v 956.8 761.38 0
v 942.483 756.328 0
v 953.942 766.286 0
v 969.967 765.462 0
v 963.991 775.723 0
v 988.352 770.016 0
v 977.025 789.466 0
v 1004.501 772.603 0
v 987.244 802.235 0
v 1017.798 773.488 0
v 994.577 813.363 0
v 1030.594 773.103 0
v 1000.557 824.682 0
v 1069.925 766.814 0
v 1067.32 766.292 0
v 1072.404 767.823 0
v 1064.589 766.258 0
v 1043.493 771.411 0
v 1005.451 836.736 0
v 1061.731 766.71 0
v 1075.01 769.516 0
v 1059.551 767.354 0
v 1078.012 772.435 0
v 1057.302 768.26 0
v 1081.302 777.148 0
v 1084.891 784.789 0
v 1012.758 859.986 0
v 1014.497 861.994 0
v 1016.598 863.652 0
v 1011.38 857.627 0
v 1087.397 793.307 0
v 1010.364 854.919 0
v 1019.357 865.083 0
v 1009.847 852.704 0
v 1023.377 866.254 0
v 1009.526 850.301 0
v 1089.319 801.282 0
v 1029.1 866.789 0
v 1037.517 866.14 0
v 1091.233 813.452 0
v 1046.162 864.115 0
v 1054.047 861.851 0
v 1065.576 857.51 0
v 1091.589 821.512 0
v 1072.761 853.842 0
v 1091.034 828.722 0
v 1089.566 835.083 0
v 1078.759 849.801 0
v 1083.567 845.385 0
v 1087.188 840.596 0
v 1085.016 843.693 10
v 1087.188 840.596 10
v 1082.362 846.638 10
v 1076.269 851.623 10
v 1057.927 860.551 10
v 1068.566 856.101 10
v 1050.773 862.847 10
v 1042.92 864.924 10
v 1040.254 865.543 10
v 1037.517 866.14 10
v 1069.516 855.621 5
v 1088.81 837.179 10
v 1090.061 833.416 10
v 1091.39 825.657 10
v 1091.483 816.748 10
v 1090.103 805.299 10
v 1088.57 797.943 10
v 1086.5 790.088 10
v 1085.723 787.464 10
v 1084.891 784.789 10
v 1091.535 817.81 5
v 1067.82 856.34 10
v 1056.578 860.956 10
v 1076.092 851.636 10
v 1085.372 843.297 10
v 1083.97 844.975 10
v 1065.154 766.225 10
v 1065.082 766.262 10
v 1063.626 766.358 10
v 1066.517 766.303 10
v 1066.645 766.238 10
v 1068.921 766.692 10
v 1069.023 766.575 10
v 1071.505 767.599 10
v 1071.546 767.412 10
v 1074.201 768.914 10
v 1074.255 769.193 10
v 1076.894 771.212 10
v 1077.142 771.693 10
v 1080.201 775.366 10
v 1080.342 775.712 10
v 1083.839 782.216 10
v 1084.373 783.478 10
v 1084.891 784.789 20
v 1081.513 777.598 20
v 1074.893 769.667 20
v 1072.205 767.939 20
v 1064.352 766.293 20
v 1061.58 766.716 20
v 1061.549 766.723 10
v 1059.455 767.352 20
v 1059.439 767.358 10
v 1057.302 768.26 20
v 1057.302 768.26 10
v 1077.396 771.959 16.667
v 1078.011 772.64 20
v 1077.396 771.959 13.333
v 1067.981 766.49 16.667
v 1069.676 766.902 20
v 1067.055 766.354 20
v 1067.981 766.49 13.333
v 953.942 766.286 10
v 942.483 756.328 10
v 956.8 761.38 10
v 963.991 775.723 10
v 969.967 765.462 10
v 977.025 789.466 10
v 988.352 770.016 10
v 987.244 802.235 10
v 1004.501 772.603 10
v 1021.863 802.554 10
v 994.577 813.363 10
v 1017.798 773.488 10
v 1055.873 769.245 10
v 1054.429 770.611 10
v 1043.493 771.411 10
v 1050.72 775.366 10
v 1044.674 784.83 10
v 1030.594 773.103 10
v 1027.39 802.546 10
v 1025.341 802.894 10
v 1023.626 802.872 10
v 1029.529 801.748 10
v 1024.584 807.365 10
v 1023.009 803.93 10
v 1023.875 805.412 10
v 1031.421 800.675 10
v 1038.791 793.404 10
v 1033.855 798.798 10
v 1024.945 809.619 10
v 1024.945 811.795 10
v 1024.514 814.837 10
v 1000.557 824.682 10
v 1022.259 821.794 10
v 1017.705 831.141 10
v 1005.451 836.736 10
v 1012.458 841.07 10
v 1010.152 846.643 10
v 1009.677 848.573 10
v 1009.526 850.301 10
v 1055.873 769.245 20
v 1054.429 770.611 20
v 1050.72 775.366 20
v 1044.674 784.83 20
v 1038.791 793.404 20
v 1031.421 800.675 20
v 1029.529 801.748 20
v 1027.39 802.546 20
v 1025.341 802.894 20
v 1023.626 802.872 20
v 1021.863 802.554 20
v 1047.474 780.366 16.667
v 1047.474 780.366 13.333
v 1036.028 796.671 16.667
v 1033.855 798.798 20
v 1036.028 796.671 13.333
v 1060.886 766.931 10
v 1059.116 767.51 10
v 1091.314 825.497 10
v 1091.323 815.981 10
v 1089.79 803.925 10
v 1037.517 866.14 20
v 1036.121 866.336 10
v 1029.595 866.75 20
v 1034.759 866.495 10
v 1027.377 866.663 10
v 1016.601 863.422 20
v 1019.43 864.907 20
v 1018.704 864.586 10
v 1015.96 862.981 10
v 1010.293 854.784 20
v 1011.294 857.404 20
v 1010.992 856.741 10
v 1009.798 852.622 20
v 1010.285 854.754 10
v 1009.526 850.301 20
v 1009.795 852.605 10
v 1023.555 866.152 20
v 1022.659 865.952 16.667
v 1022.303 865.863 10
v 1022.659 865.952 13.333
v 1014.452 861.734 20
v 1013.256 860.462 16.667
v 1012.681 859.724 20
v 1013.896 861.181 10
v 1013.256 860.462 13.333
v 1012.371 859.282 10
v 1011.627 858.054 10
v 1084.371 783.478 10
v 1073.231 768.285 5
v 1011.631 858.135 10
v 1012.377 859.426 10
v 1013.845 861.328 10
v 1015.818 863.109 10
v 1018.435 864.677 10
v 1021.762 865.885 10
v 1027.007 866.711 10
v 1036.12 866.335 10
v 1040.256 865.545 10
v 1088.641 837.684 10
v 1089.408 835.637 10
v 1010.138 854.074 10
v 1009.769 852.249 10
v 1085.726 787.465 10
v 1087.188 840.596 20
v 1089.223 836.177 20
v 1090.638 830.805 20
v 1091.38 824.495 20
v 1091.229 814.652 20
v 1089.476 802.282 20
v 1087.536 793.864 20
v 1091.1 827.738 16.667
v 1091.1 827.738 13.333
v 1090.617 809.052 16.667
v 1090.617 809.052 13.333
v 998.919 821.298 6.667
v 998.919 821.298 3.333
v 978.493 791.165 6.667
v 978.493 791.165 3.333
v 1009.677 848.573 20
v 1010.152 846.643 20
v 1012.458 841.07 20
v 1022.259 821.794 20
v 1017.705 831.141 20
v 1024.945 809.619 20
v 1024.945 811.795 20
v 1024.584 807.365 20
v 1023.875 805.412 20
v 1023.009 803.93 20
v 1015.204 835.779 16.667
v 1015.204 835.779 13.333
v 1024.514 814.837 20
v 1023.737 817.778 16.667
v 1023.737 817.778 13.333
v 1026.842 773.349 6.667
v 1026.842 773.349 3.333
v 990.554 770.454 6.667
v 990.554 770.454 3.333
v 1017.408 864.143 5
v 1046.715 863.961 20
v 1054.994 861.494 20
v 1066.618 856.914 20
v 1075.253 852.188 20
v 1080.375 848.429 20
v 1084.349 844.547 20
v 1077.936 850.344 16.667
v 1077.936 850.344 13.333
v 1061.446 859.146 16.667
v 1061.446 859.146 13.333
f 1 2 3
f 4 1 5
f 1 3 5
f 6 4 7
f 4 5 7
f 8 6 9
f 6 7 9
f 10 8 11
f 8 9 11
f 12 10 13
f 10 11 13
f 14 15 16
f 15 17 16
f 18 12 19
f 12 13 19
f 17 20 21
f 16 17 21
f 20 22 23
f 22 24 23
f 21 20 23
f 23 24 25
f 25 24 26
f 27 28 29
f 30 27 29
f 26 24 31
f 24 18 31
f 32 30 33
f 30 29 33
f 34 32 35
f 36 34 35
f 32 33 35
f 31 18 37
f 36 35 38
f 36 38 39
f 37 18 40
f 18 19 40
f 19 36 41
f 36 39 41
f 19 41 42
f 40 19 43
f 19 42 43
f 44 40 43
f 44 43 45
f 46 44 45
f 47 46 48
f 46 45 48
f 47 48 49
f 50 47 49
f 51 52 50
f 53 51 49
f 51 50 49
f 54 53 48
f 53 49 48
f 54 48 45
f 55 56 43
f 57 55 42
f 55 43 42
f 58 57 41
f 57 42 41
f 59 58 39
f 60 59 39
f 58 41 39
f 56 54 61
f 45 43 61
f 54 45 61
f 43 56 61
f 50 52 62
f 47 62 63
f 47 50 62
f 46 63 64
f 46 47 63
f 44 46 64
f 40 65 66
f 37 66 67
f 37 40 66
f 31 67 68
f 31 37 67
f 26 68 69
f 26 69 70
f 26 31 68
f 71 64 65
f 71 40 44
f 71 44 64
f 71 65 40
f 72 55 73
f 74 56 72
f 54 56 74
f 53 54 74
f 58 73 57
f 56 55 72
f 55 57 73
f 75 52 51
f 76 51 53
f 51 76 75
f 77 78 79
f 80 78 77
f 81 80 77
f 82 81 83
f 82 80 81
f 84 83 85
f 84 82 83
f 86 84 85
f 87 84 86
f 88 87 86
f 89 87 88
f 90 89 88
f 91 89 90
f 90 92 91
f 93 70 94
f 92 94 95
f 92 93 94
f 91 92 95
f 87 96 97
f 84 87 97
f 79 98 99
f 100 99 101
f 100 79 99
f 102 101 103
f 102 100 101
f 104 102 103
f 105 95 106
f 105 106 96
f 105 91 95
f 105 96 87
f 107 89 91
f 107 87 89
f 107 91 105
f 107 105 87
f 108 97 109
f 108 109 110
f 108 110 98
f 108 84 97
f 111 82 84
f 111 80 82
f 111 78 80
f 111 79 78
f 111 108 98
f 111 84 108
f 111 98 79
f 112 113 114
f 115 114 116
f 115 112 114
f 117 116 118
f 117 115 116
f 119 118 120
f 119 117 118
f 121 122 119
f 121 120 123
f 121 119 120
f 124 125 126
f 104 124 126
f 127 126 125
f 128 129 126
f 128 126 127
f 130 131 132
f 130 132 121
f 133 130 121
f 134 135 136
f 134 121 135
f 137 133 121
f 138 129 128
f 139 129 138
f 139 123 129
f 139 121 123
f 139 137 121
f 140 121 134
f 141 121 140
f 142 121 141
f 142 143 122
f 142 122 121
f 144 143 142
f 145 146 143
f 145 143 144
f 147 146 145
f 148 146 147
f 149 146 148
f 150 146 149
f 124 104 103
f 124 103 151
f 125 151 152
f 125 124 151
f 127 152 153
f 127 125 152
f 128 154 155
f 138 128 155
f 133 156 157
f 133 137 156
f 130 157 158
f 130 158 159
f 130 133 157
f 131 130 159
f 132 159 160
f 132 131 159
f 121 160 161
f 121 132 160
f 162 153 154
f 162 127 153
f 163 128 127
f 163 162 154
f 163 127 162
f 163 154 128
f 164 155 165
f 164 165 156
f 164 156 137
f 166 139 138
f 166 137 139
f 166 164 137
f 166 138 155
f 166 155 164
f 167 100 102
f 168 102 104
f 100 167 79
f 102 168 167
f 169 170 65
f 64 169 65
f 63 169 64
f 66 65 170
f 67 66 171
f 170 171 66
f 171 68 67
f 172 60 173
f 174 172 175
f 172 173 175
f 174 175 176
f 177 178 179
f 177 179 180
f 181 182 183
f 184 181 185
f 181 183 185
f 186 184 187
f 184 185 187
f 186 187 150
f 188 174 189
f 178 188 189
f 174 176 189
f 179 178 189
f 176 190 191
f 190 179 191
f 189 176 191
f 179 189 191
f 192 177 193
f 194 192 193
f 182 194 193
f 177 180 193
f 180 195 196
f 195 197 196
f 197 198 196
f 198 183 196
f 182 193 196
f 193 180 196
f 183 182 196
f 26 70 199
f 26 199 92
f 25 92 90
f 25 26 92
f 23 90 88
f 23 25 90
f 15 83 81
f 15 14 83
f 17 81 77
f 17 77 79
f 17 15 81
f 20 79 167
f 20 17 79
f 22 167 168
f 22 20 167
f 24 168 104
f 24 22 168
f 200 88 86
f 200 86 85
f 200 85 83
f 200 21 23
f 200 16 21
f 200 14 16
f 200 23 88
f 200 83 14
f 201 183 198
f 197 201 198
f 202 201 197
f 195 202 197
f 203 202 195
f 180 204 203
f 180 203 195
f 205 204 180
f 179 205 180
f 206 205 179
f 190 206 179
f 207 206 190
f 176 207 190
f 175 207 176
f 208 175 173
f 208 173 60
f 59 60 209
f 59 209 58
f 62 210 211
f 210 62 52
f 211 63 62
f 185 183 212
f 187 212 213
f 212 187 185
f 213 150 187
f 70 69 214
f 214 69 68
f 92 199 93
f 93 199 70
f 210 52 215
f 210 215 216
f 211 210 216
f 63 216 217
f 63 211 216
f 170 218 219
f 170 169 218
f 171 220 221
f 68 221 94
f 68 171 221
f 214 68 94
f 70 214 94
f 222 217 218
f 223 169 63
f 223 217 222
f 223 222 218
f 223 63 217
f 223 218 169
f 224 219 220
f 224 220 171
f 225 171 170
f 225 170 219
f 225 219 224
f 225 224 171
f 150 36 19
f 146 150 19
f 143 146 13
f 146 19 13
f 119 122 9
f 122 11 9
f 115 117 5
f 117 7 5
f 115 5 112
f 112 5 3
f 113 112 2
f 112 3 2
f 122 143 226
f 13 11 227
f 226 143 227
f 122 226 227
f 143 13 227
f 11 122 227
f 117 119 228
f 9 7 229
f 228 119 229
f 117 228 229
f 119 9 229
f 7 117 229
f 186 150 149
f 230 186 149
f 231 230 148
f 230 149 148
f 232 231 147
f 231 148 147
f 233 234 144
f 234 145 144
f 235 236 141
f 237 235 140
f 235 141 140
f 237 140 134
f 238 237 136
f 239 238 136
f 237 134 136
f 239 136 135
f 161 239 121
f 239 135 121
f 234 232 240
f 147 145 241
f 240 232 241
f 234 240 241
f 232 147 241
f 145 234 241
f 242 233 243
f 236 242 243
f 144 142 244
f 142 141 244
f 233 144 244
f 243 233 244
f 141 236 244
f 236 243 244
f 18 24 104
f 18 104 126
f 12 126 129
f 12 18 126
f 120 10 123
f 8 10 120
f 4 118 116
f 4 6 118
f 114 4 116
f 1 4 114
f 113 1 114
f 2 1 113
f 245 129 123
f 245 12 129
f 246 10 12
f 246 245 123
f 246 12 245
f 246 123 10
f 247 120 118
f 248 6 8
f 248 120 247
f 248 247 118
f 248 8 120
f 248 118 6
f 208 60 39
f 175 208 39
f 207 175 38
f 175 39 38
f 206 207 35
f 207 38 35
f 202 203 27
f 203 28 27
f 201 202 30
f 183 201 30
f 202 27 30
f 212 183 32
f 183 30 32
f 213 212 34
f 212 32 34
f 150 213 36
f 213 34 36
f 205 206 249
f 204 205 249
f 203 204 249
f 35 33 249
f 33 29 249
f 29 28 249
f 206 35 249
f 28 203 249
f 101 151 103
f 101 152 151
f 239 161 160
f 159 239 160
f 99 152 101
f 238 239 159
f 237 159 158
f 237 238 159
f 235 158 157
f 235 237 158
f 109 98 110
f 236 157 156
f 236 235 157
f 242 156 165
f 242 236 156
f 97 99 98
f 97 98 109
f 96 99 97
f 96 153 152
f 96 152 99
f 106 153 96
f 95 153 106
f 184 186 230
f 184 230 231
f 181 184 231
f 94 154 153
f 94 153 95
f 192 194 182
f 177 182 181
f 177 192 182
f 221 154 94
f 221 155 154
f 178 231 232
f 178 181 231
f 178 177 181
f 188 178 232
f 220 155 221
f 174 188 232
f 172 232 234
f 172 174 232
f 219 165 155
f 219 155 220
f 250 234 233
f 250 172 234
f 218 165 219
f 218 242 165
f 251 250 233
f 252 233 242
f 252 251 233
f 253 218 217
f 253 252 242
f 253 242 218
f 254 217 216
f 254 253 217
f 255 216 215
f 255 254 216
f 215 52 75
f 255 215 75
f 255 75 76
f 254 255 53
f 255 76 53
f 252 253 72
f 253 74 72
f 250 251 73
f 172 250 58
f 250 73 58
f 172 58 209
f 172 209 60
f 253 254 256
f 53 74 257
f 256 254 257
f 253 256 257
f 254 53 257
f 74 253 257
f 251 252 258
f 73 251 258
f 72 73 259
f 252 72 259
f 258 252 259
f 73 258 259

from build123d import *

# Parameters (mm, degrees)
BOSS_EXTRUDE1_DEPTH = 10
BOSS_EXTRUDE2_DEPTH = 10


with BuildPart() as part:
    # Sketch1 → Boss-Extrude1 (new body)
    with BuildSketch(Plane.XY):
        with BuildLine():
            add(Edge.make_bspline(
                [(1087.187780825, 840.59586504), (1076.67910482, 857.874790108), (1037.516605064, 866.140022112)],
                knots=[0, 0, 0, 1, 1, 1], degree=2))
            add(Edge.make_bspline(
                [(1037.516605064, 866.140022112), (1011.295592155, 870.066211203), (1009.525576357, 850.301034786)],
                knots=[0, 0, 0, 1, 1, 1], degree=2))
            add(Edge.make_bspline(
                [(1009.525576357, 850.301034786), (1001.907342818, 820.670179882), (988.206449115, 794.709110121), (942.482736763, 756.327533098)],
                knots=[0, 0, 0, 0, 1, 1, 1, 1], degree=3))
            add(Edge.make_bspline(
                [(1057.301588716, 768.260369991), (1027.770781215, 776.257647836), (998.429870334, 777.153516176), (942.482736763, 756.327533098)],
                knots=[0, 0, 0, 0, 1, 1, 1, 1], degree=3))
            add(Edge.make_bspline(
                [(1084.891265336, 784.788556571), (1075.365665589, 760.045488285), (1057.301588716, 768.260369991)],
                knots=[0, 0, 0, 1, 1, 1], degree=2))
            add(Edge.make_bspline(
                [(1087.187780825, 840.59586504), (1097.029795788, 822.928712911), (1084.891265336, 784.788556571)],
                knots=[0, 0, 0, 1, 1, 1], degree=2))
        make_face()
    extrude(amount=BOSS_EXTRUDE1_DEPTH)

    # Sketch3 → Boss-Extrude2 (add)
    with BuildSketch(Plane.XY.offset(10)):
        with BuildLine():
            add(Edge.make_bspline(
                [(1087.187780825, 840.59586504), (1081.487119197, 850.529819758), (1065.232454637, 860.336996081), (1037.516605064, 866.140022112)],
                knots=[0, 0, 0, 0, 1, 1, 1, 1], degree=3))
            add(Edge.make_bspline(
                [(1037.516605064, 866.140022112), (1020.004409568, 868.813580173), (1010.347971001, 862.587896026), (1009.525576357, 850.301034786)],
                knots=[0, 0, 0, 0, 1, 1, 1, 1], degree=3))
            add(Edge.make_bspline(
                [(1009.525576357, 850.301034786), (1009.355347436, 839.605465182), (1033.361525181, 814.302214514), (1021.863356533, 802.554480195)],
                knots=[0, 0, 0, 0, 1, 1, 1, 1], degree=3))
            add(Edge.make_bspline(
                [(1057.301588716, 768.260369991), (1047.915219632, 773.390697705), (1037.755299032, 806.75725398), (1021.863356533, 802.554480195)],
                knots=[0, 0, 0, 0, 1, 1, 1, 1], degree=3))
            add(Edge.make_bspline(
                [(1084.891265336, 784.788556571), (1078.57410115, 768.238078014), (1068.393818008, 762.911936443), (1057.301588716, 768.260369991)],
                knots=[0, 0, 0, 0, 1, 1, 1, 1], degree=3))
            add(Edge.make_bspline(
                [(1087.187780825, 840.59586504), (1093.014393603, 830.735257407), (1093.522224403, 811.757983228), (1084.891265336, 784.788556571)],
                knots=[0, 0, 0, 0, 1, 1, 1, 1], degree=3))
        make_face()
    extrude(amount=BOSS_EXTRUDE2_DEPTH)


solid = part.part
